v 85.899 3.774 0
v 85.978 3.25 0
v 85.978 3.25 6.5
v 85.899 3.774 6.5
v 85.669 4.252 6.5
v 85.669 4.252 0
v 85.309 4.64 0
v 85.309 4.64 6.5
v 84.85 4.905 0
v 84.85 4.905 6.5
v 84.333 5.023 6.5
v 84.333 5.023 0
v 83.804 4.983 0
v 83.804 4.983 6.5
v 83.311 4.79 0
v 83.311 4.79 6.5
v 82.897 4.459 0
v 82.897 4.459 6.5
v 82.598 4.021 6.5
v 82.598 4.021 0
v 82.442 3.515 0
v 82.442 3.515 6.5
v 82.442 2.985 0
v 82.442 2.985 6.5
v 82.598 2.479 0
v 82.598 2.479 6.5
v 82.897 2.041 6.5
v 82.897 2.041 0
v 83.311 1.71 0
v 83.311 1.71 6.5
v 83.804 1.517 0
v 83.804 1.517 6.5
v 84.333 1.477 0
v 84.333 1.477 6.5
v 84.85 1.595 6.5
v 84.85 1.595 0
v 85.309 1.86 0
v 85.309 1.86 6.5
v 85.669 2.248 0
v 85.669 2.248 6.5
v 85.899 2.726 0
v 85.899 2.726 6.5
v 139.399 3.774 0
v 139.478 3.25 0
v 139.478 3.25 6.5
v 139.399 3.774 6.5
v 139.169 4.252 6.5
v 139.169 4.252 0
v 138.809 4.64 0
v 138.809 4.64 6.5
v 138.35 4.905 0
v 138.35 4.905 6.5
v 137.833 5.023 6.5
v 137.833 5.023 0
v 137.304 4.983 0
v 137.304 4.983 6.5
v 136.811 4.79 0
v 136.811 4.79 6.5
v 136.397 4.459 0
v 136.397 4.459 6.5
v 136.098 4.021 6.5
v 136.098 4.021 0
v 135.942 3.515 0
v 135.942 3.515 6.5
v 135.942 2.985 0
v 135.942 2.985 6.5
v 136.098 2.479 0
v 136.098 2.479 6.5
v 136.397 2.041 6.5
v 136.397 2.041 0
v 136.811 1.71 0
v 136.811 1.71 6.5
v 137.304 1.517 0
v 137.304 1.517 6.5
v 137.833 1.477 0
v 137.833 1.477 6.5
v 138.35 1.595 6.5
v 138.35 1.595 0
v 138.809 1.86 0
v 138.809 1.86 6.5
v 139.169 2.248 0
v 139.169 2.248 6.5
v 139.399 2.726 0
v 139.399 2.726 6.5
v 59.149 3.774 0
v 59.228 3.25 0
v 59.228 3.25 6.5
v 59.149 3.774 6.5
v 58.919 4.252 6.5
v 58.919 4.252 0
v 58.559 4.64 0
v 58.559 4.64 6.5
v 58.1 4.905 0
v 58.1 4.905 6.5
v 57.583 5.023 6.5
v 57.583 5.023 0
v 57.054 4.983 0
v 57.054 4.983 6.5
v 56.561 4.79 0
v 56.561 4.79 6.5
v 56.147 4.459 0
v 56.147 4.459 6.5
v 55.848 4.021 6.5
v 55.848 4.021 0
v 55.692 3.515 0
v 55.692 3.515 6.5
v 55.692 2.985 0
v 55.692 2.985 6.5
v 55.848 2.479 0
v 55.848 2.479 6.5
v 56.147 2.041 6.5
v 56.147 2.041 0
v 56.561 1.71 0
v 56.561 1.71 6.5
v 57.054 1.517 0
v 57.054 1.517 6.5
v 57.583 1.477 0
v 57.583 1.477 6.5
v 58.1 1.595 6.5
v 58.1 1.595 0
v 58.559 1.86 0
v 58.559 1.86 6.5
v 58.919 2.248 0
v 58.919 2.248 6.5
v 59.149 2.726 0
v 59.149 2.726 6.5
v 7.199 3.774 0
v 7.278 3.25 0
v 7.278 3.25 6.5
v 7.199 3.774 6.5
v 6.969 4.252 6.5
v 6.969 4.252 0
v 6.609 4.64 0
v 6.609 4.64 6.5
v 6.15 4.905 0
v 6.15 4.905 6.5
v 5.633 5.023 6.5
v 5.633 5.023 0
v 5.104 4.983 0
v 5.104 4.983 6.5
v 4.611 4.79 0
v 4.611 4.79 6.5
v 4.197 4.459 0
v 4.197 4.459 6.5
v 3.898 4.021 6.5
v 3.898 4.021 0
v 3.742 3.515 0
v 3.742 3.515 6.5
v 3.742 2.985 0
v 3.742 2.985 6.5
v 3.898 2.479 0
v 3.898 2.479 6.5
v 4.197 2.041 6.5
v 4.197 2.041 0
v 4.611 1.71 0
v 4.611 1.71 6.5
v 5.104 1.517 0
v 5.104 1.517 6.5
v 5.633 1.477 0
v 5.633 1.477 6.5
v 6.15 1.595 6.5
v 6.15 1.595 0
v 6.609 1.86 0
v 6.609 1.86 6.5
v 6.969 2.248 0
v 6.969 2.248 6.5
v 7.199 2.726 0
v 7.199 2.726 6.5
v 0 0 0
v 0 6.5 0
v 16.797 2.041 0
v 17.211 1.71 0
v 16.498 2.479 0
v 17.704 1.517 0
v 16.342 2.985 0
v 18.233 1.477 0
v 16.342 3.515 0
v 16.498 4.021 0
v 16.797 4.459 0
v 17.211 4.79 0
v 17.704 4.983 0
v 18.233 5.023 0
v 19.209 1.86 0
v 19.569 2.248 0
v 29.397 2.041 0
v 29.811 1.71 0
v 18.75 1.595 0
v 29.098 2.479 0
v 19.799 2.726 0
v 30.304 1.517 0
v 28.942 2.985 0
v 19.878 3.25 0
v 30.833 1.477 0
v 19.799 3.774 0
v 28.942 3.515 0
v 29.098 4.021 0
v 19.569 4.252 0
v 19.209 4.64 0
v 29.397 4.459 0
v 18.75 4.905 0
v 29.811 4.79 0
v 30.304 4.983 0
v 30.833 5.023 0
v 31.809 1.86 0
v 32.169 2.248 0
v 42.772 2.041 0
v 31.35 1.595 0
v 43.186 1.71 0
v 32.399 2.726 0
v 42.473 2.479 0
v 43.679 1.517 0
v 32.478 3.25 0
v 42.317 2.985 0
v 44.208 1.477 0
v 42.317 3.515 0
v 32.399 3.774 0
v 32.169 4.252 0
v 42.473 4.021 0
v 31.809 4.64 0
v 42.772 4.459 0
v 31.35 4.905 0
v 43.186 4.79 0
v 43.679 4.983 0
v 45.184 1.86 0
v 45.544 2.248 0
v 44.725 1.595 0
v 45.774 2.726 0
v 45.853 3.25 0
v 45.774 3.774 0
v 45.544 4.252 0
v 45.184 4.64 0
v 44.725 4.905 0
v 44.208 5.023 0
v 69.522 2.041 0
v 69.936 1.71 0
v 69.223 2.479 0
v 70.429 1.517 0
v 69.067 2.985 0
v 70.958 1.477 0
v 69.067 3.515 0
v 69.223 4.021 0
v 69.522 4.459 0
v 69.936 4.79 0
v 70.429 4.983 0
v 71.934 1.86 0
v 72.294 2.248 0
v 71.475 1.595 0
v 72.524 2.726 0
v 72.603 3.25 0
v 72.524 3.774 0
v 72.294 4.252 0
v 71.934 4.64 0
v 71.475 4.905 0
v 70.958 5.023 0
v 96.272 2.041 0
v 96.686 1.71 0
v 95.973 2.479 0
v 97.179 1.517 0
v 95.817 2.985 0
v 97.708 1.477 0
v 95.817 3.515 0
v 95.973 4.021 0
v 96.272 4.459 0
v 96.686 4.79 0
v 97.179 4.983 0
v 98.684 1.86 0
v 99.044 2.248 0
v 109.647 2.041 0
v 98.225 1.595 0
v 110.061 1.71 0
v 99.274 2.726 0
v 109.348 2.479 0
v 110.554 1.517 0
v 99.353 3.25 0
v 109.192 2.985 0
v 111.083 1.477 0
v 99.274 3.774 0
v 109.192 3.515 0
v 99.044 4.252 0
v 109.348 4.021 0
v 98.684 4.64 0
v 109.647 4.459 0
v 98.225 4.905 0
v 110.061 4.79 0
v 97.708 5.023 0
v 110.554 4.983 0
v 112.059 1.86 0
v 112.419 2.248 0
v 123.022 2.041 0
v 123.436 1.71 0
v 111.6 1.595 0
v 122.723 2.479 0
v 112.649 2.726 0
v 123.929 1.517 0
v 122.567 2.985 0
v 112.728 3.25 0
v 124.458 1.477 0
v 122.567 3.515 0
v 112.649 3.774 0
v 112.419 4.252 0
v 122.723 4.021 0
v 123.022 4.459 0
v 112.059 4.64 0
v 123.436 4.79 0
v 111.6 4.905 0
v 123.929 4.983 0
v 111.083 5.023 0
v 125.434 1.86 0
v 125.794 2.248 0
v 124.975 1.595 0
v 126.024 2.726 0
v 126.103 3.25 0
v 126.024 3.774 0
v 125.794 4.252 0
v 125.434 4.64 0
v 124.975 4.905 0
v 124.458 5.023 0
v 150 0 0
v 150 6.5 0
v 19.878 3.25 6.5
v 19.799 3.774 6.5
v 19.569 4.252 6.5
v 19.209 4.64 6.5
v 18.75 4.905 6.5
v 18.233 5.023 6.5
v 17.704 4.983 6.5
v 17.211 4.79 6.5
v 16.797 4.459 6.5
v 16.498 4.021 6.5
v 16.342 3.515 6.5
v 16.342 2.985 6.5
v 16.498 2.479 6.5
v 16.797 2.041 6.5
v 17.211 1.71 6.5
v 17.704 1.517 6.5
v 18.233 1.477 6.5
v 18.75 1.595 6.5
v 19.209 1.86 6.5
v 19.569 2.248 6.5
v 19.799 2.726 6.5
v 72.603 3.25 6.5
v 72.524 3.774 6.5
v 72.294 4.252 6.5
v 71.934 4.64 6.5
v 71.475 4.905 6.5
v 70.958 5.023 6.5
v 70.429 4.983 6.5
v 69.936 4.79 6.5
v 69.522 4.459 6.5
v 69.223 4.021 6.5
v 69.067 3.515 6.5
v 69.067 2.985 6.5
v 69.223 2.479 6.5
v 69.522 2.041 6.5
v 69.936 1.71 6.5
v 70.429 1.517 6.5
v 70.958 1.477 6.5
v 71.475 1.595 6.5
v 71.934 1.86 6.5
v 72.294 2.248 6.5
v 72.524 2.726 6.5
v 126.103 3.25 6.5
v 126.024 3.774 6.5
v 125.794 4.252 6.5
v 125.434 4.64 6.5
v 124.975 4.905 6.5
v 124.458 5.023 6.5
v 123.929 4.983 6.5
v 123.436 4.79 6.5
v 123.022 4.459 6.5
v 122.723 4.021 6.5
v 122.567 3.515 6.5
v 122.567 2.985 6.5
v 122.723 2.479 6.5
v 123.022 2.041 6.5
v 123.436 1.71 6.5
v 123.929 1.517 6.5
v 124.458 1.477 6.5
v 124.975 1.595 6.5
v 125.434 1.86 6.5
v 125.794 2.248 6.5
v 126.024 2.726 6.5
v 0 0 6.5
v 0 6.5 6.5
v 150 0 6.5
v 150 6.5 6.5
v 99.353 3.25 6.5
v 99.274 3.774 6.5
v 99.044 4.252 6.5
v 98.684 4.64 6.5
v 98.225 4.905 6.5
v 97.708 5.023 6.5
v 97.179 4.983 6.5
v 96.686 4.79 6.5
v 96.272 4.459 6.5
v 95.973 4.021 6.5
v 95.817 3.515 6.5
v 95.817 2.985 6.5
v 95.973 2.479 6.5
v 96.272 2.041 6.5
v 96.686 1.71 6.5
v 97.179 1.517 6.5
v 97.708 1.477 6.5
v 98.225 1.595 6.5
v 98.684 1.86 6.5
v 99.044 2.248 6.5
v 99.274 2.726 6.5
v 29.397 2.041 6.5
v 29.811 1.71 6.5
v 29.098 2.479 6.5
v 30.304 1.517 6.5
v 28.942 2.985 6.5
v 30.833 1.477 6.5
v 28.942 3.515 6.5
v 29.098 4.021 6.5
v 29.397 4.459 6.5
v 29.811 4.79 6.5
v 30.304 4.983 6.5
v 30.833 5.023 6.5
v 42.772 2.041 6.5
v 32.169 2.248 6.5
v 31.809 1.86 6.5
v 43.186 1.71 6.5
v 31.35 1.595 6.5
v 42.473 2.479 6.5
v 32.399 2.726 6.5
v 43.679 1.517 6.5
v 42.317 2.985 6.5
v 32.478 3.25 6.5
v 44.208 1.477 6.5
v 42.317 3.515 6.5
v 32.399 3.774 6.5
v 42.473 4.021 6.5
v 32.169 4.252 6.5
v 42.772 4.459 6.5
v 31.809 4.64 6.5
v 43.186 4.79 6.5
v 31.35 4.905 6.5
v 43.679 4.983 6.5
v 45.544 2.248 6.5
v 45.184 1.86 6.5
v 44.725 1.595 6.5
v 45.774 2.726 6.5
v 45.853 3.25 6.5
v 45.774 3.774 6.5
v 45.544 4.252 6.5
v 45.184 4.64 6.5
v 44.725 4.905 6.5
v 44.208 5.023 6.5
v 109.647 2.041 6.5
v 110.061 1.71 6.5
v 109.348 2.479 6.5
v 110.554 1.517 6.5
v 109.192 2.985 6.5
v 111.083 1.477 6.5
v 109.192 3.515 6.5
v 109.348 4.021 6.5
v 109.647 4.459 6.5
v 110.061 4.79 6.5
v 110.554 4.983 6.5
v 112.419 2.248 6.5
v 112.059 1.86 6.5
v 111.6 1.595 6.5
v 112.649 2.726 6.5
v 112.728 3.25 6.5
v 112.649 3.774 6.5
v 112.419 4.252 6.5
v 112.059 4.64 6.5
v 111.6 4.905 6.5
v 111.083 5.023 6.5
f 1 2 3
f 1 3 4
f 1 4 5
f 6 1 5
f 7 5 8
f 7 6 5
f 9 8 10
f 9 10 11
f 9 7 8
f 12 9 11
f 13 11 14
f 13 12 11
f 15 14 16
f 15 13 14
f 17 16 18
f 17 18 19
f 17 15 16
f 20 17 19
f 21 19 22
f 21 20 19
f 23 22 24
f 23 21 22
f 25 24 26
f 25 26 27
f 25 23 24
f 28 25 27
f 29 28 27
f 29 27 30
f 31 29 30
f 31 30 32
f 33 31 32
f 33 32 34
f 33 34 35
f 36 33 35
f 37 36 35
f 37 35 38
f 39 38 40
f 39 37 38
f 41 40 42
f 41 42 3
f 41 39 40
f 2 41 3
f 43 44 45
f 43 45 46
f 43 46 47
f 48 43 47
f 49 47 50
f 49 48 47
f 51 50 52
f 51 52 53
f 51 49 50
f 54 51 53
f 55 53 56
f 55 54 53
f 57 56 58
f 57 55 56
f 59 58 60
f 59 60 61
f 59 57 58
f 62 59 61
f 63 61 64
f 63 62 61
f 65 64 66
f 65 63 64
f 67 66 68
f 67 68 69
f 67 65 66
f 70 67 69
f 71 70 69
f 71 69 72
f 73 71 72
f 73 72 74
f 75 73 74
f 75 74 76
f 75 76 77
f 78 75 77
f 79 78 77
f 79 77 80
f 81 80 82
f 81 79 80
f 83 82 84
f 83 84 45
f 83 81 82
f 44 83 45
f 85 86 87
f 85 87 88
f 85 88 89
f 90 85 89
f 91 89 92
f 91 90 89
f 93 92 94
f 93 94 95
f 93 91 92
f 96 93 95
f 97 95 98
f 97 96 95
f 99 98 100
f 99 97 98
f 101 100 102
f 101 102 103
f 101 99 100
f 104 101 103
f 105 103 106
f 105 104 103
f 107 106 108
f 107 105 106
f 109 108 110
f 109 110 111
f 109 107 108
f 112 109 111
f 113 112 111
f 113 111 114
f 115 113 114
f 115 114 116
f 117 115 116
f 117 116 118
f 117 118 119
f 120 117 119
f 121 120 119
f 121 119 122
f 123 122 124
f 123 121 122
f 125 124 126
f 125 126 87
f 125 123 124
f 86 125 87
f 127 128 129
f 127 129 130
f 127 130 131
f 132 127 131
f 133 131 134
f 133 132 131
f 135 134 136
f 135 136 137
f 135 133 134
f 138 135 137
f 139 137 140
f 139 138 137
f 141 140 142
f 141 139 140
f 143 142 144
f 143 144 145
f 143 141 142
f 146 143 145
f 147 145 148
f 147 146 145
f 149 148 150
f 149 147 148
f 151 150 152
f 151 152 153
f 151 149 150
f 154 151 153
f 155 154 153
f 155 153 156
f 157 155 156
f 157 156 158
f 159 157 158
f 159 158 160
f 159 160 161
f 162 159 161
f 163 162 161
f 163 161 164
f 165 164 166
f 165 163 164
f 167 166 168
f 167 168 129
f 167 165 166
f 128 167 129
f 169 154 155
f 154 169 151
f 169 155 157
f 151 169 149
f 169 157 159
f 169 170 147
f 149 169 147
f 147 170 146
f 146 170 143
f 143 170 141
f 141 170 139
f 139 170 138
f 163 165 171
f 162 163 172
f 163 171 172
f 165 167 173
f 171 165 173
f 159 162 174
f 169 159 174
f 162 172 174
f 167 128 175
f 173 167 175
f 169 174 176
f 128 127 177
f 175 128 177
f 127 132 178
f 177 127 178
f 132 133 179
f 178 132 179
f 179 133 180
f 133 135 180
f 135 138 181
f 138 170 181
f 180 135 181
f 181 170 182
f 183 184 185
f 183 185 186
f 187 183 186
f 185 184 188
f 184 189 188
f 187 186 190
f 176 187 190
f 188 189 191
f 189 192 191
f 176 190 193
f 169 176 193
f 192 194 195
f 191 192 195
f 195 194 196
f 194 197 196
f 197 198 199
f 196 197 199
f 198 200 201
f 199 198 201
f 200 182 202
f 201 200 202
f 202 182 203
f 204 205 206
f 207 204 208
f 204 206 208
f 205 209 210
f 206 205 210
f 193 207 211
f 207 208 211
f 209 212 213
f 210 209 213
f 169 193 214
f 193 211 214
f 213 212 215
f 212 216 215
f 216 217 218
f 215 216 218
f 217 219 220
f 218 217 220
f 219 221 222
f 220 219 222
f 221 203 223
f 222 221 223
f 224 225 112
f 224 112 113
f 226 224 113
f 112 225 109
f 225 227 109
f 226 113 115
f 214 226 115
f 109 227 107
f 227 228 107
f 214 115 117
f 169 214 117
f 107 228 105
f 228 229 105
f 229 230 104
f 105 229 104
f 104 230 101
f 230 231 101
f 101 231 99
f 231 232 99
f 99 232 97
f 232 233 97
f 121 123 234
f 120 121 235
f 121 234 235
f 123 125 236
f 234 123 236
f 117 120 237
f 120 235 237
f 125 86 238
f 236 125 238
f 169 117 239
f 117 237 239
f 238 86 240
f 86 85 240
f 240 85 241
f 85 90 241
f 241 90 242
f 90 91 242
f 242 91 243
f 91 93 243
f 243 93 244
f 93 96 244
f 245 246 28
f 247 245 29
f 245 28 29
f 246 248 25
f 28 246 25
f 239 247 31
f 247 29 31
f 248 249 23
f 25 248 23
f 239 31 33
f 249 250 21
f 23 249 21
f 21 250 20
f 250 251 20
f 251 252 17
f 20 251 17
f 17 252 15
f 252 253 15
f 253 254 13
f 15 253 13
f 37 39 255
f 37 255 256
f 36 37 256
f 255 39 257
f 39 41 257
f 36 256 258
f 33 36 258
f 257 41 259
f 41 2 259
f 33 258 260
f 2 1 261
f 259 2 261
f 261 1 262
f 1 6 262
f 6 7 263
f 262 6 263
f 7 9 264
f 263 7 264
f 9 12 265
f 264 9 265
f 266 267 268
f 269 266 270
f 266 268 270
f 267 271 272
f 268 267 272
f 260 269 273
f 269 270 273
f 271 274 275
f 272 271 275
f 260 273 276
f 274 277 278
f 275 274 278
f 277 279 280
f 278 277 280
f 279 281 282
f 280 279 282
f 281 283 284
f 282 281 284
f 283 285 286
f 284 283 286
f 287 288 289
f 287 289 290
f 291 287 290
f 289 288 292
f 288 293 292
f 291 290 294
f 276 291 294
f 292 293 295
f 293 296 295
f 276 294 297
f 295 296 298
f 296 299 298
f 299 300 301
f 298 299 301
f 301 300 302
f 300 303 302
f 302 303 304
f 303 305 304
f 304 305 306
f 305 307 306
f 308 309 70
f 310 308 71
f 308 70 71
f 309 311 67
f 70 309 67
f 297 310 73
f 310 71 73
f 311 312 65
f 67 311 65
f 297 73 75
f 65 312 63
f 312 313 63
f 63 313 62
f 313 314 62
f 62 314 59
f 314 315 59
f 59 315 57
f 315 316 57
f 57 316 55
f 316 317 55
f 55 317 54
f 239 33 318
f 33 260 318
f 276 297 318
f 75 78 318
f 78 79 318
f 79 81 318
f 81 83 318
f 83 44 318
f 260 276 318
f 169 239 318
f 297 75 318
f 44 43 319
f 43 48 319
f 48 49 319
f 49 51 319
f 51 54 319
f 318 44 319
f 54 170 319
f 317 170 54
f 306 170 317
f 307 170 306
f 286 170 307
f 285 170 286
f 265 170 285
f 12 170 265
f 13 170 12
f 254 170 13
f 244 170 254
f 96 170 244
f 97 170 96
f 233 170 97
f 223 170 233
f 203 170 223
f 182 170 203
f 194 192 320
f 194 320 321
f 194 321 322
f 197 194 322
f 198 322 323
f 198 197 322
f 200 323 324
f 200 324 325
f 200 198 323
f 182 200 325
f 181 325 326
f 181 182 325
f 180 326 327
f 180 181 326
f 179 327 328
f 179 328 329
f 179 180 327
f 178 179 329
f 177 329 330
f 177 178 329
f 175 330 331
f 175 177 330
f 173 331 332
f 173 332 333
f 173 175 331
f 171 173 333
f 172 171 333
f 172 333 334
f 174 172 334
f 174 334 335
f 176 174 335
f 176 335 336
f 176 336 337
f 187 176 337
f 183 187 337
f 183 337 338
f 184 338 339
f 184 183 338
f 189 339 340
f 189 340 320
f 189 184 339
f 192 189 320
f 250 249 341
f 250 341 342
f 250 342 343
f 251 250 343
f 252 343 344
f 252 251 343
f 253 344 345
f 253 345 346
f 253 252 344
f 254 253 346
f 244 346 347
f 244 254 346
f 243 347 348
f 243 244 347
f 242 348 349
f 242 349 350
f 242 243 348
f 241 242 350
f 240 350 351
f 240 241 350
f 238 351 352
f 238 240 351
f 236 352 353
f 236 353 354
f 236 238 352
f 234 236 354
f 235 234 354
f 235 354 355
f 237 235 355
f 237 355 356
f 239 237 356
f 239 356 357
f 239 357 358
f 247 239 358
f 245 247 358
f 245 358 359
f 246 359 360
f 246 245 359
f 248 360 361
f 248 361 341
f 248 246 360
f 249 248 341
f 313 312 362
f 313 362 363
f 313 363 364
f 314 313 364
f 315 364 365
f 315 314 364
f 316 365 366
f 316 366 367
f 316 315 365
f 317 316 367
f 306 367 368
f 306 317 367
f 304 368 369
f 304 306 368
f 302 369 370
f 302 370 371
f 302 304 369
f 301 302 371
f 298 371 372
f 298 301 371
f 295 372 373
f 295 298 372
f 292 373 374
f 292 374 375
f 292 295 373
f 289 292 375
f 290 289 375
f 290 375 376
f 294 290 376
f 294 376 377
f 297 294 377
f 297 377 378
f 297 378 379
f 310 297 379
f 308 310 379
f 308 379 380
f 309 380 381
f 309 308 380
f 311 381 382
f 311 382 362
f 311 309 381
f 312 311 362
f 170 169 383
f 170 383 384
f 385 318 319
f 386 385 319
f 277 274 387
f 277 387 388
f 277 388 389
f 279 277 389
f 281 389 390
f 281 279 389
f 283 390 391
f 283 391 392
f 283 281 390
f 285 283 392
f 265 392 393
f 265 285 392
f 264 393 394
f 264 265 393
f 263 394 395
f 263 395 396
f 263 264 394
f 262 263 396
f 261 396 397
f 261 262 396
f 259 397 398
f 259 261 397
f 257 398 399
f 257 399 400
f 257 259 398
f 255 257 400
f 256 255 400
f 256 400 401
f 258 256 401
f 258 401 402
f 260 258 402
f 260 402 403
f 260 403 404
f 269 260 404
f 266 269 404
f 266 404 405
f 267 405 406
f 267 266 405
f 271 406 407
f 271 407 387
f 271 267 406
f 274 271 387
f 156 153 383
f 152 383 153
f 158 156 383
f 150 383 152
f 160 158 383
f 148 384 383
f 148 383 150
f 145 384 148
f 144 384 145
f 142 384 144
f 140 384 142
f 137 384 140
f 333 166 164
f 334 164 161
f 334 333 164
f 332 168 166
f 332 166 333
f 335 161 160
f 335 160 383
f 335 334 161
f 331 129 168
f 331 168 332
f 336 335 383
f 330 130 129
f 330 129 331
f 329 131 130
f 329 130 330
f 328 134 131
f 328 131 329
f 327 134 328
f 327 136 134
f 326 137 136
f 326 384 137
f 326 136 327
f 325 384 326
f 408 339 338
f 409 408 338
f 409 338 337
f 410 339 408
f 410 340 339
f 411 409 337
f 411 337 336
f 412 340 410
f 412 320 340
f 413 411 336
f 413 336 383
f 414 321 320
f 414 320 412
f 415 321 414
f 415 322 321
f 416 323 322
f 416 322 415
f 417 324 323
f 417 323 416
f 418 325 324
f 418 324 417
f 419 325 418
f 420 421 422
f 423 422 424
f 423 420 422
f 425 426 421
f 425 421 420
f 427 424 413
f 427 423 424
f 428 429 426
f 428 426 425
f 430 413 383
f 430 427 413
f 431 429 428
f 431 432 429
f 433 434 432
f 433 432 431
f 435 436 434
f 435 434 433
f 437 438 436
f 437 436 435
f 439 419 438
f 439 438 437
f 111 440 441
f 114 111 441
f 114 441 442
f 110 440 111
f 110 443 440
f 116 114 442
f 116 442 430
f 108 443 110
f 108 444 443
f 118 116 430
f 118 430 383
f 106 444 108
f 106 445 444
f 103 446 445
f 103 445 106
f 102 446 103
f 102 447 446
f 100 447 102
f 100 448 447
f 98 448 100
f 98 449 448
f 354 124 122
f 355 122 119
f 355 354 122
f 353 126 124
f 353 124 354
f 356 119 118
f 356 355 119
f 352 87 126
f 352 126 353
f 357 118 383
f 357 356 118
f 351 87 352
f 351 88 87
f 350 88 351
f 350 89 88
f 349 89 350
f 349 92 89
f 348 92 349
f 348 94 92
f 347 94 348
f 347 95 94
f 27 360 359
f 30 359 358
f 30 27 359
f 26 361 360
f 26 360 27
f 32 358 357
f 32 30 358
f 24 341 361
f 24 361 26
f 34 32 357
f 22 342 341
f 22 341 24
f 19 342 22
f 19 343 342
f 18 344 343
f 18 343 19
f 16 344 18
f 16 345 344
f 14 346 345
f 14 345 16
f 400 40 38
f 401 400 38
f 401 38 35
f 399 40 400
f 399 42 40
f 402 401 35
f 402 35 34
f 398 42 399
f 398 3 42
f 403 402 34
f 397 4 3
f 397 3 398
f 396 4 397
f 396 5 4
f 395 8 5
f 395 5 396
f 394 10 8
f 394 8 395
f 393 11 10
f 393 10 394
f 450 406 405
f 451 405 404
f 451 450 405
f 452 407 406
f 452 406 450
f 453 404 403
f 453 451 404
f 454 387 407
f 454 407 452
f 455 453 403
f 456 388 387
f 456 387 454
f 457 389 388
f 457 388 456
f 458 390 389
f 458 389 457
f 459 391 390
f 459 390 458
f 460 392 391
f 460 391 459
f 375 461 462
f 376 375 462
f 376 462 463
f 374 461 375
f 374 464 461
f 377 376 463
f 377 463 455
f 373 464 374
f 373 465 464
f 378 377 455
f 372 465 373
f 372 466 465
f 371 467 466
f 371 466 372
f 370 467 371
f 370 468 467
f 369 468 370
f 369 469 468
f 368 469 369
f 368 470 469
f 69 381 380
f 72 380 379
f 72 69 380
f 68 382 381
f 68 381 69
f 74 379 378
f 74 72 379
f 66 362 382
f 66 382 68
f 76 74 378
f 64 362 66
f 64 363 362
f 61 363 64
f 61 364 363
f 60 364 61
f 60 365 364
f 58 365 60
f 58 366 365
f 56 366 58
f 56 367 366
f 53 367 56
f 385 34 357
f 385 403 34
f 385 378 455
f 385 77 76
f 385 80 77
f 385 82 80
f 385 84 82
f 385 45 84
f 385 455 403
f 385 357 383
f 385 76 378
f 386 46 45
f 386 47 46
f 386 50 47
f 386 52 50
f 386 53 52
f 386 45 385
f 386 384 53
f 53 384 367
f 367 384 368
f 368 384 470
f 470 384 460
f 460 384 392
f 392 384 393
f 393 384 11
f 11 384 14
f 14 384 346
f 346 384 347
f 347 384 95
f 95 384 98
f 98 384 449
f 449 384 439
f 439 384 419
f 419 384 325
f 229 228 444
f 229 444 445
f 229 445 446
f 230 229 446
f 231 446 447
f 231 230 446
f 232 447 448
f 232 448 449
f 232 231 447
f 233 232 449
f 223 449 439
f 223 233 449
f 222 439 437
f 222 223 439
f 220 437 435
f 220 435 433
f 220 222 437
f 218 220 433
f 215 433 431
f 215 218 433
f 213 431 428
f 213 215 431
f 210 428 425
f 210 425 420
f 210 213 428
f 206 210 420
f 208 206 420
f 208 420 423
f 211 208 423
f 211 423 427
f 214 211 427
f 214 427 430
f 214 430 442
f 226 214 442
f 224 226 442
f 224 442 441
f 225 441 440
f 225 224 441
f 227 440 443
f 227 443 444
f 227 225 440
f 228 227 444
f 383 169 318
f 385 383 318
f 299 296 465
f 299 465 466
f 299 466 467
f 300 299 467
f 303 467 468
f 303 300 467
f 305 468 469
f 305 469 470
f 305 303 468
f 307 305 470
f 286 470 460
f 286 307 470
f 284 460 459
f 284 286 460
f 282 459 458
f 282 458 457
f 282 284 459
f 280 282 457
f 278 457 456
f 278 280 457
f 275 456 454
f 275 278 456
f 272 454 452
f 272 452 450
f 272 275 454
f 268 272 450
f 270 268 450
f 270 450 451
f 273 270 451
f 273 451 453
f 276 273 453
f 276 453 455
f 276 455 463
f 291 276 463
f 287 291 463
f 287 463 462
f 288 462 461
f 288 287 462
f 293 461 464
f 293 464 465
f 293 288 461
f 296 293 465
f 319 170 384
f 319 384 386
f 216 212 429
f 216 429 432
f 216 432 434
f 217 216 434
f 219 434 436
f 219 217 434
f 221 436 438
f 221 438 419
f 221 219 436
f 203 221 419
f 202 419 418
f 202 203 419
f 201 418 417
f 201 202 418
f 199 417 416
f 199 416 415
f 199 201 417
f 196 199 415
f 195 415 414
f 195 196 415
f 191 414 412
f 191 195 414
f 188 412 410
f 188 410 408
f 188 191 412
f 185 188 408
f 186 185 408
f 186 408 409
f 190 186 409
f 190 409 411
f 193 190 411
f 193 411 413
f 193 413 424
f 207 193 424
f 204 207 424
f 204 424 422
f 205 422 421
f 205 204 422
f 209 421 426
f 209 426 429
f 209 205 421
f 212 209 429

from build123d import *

# Parameters (mm, degrees)
F0_W     = 150
F0_H     = 6.5
F0_R     = 1.778
F1_DEPTH = 6.5


with BuildPart() as f1:
    # F0 (on Top) → F1 (new body)
    with BuildSketch(Plane.XY):
        with Locations((75, 3.25)):
            Rectangle(F0_W, F0_H)
        with Locations((5.5, 3.25)):
            Circle(F0_R, mode=Mode.SUBTRACT)
        with Locations((18.1, 3.25)):
            Circle(F0_R, mode=Mode.SUBTRACT)
        with Locations((30.7, 3.25)):
            Circle(F0_R, mode=Mode.SUBTRACT)
        with Locations((44.075, 3.25)):
            Circle(F0_R, mode=Mode.SUBTRACT)
        with Locations((57.45, 3.25)):
            Circle(F0_R, mode=Mode.SUBTRACT)
        with Locations((70.825, 3.25)):
            Circle(F0_R, mode=Mode.SUBTRACT)
        with Locations((84.2, 3.25)):
            Circle(F0_R, mode=Mode.SUBTRACT)
        with Locations((97.575, 3.25)):
            Circle(F0_R, mode=Mode.SUBTRACT)
        with Locations((110.95, 3.25)):
            Circle(F0_R, mode=Mode.SUBTRACT)
        with Locations((124.325, 3.25)):
            Circle(F0_R, mode=Mode.SUBTRACT)
        with Locations((137.7, 3.25)):
            Circle(F0_R, mode=Mode.SUBTRACT)
    extrude(amount=F1_DEPTH)


solid = f1.part
